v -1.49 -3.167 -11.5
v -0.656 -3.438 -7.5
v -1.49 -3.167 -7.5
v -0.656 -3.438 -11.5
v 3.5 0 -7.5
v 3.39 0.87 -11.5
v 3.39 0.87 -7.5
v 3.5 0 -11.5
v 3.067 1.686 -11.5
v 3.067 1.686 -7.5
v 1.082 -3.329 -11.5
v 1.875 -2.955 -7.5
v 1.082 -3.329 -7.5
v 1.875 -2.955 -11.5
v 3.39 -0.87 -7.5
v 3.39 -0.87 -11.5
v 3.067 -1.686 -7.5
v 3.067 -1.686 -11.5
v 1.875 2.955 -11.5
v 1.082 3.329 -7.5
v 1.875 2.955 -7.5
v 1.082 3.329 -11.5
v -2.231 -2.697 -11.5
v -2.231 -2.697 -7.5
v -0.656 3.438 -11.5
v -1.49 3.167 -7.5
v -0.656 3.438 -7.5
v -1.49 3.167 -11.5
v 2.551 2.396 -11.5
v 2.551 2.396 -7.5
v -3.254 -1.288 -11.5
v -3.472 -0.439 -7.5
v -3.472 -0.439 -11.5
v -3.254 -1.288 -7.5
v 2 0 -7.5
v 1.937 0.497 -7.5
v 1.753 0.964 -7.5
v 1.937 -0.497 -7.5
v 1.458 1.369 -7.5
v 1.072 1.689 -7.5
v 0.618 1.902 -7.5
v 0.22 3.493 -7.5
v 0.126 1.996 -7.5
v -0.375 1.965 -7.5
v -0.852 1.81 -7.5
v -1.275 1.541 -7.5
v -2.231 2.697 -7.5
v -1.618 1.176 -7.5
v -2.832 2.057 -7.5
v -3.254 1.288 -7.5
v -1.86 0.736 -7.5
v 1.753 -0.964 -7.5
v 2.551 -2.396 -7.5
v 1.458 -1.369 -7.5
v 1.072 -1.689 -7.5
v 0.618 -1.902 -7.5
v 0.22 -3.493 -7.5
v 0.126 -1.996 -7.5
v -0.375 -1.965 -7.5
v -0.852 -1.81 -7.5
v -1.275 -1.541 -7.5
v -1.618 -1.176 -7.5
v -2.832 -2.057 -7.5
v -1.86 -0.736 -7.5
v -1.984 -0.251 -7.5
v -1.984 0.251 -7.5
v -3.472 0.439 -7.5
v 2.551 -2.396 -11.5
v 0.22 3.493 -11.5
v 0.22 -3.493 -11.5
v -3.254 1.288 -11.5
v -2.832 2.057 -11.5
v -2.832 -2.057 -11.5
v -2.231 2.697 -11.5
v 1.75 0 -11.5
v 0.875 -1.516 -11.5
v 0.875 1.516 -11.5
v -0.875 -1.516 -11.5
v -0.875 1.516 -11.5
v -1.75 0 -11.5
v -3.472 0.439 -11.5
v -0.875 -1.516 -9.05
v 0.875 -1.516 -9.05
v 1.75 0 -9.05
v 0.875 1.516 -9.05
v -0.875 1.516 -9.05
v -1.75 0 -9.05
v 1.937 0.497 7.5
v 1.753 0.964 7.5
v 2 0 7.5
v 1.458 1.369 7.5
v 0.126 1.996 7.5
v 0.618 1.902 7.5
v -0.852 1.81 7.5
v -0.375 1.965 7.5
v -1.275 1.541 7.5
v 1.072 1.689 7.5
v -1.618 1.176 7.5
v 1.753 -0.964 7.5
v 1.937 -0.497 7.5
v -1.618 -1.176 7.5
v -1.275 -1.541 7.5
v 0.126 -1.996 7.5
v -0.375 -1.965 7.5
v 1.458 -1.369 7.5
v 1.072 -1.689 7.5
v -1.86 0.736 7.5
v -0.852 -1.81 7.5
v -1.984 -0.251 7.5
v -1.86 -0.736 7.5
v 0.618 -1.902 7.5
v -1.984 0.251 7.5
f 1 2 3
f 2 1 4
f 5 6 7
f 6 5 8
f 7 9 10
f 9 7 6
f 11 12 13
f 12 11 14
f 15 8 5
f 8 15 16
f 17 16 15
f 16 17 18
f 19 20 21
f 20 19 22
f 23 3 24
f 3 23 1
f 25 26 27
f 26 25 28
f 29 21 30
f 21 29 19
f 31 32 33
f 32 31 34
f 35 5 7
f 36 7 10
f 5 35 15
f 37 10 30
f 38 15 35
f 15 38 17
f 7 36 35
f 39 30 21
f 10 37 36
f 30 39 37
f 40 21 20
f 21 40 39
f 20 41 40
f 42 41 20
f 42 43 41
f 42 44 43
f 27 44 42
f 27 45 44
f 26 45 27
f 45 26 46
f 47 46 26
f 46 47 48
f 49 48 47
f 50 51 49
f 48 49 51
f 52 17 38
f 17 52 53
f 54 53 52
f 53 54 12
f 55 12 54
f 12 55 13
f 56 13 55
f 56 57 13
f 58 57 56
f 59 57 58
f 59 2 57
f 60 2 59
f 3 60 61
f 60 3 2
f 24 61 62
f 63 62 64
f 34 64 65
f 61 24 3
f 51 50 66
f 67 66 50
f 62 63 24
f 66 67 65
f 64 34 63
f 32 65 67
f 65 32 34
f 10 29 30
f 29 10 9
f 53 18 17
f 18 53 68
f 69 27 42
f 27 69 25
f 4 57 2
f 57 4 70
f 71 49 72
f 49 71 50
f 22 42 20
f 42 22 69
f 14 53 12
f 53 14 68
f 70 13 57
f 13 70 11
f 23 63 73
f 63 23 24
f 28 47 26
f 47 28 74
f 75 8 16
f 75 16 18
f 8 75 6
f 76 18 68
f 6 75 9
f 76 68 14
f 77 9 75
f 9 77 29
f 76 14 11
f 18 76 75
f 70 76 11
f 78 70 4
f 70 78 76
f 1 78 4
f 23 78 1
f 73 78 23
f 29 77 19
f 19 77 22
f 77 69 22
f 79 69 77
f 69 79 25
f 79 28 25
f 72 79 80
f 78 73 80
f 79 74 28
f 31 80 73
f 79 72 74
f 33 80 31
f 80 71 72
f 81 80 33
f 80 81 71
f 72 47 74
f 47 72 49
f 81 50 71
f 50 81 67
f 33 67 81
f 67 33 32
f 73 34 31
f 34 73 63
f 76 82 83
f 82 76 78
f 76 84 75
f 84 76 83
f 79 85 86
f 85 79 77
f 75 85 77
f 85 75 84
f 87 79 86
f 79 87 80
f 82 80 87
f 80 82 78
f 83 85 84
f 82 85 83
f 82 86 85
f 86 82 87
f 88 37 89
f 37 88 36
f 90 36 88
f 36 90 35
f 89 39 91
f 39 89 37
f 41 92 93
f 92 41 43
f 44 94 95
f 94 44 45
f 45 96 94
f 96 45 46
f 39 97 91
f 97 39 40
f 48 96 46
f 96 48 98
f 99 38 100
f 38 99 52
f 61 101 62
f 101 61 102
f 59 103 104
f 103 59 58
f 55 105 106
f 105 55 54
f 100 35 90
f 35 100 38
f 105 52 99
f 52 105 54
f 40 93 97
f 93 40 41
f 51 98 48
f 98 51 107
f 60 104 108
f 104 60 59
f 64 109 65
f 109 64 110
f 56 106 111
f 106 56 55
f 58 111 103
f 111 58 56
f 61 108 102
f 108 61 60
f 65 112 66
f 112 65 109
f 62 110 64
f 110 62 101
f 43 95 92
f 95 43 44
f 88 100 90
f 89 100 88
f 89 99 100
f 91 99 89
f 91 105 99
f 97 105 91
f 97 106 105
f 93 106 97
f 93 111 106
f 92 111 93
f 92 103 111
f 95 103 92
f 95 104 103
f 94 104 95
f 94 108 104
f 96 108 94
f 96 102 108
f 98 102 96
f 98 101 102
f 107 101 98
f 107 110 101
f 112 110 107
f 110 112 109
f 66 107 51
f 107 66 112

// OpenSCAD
// file: lib/screw_nuts.scad
$fn=25;

module screw_m3(h=20, button=false){
    cylinder(d=3, h=h, center=true);
    translate([0, 0, -h/2-1.5])
        difference(){
            cylinder(d=5.5, h=3, center=true);
            translate([0, 0, -0.8])
                cylinder(d=2.8, h=1.8, $fn=6, center=true);
        }
}

module screw_m4(h=20, button=false){
    cylinder(d=4, h=h, center=true);
    translate([0, 0, -h/2-2])
        difference(){
            if (button) {
                translate([0, 0, 2])
                    scale([1, 1, 6/7.5])
                    sphere(d=7.5);
            } else {
                cylinder(d=7, h=4, center=true);
            }
            if (button) {
                 translate([0, 0, 5])
                    cube([7.6, 7.6, 6], center=true);
            }
            translate([0, 0, -0.8])
                cylinder(d=3.5, h=2.5, $fn=6, center=true);
        }
}

module nut_m3(){
    difference(){
        cylinder(d=6, h=2.4, $fn=6);
        translate([0, 0, -0.05])
            cylinder(d=3, h=2.5);
    }
}

module nut_m4(){
    difference(){
        cylinder(d=7.6, h=3.2, $fn=6);
        translate([0, 0, -0.05])
            cylinder(d=4, h=3.3);
    }
}

module washer_m3(h){
    difference(){
        cylinder(d=8, h=h, center=true);
        cylinder(d=3.5, h=h+0.1, center=true);
    }
}
// main file
// NAME: Screw M4x15
// COLOR: 80
// CATEGORY: Support

include <lib/screw_nuts.scad>

screw_m4(15);
